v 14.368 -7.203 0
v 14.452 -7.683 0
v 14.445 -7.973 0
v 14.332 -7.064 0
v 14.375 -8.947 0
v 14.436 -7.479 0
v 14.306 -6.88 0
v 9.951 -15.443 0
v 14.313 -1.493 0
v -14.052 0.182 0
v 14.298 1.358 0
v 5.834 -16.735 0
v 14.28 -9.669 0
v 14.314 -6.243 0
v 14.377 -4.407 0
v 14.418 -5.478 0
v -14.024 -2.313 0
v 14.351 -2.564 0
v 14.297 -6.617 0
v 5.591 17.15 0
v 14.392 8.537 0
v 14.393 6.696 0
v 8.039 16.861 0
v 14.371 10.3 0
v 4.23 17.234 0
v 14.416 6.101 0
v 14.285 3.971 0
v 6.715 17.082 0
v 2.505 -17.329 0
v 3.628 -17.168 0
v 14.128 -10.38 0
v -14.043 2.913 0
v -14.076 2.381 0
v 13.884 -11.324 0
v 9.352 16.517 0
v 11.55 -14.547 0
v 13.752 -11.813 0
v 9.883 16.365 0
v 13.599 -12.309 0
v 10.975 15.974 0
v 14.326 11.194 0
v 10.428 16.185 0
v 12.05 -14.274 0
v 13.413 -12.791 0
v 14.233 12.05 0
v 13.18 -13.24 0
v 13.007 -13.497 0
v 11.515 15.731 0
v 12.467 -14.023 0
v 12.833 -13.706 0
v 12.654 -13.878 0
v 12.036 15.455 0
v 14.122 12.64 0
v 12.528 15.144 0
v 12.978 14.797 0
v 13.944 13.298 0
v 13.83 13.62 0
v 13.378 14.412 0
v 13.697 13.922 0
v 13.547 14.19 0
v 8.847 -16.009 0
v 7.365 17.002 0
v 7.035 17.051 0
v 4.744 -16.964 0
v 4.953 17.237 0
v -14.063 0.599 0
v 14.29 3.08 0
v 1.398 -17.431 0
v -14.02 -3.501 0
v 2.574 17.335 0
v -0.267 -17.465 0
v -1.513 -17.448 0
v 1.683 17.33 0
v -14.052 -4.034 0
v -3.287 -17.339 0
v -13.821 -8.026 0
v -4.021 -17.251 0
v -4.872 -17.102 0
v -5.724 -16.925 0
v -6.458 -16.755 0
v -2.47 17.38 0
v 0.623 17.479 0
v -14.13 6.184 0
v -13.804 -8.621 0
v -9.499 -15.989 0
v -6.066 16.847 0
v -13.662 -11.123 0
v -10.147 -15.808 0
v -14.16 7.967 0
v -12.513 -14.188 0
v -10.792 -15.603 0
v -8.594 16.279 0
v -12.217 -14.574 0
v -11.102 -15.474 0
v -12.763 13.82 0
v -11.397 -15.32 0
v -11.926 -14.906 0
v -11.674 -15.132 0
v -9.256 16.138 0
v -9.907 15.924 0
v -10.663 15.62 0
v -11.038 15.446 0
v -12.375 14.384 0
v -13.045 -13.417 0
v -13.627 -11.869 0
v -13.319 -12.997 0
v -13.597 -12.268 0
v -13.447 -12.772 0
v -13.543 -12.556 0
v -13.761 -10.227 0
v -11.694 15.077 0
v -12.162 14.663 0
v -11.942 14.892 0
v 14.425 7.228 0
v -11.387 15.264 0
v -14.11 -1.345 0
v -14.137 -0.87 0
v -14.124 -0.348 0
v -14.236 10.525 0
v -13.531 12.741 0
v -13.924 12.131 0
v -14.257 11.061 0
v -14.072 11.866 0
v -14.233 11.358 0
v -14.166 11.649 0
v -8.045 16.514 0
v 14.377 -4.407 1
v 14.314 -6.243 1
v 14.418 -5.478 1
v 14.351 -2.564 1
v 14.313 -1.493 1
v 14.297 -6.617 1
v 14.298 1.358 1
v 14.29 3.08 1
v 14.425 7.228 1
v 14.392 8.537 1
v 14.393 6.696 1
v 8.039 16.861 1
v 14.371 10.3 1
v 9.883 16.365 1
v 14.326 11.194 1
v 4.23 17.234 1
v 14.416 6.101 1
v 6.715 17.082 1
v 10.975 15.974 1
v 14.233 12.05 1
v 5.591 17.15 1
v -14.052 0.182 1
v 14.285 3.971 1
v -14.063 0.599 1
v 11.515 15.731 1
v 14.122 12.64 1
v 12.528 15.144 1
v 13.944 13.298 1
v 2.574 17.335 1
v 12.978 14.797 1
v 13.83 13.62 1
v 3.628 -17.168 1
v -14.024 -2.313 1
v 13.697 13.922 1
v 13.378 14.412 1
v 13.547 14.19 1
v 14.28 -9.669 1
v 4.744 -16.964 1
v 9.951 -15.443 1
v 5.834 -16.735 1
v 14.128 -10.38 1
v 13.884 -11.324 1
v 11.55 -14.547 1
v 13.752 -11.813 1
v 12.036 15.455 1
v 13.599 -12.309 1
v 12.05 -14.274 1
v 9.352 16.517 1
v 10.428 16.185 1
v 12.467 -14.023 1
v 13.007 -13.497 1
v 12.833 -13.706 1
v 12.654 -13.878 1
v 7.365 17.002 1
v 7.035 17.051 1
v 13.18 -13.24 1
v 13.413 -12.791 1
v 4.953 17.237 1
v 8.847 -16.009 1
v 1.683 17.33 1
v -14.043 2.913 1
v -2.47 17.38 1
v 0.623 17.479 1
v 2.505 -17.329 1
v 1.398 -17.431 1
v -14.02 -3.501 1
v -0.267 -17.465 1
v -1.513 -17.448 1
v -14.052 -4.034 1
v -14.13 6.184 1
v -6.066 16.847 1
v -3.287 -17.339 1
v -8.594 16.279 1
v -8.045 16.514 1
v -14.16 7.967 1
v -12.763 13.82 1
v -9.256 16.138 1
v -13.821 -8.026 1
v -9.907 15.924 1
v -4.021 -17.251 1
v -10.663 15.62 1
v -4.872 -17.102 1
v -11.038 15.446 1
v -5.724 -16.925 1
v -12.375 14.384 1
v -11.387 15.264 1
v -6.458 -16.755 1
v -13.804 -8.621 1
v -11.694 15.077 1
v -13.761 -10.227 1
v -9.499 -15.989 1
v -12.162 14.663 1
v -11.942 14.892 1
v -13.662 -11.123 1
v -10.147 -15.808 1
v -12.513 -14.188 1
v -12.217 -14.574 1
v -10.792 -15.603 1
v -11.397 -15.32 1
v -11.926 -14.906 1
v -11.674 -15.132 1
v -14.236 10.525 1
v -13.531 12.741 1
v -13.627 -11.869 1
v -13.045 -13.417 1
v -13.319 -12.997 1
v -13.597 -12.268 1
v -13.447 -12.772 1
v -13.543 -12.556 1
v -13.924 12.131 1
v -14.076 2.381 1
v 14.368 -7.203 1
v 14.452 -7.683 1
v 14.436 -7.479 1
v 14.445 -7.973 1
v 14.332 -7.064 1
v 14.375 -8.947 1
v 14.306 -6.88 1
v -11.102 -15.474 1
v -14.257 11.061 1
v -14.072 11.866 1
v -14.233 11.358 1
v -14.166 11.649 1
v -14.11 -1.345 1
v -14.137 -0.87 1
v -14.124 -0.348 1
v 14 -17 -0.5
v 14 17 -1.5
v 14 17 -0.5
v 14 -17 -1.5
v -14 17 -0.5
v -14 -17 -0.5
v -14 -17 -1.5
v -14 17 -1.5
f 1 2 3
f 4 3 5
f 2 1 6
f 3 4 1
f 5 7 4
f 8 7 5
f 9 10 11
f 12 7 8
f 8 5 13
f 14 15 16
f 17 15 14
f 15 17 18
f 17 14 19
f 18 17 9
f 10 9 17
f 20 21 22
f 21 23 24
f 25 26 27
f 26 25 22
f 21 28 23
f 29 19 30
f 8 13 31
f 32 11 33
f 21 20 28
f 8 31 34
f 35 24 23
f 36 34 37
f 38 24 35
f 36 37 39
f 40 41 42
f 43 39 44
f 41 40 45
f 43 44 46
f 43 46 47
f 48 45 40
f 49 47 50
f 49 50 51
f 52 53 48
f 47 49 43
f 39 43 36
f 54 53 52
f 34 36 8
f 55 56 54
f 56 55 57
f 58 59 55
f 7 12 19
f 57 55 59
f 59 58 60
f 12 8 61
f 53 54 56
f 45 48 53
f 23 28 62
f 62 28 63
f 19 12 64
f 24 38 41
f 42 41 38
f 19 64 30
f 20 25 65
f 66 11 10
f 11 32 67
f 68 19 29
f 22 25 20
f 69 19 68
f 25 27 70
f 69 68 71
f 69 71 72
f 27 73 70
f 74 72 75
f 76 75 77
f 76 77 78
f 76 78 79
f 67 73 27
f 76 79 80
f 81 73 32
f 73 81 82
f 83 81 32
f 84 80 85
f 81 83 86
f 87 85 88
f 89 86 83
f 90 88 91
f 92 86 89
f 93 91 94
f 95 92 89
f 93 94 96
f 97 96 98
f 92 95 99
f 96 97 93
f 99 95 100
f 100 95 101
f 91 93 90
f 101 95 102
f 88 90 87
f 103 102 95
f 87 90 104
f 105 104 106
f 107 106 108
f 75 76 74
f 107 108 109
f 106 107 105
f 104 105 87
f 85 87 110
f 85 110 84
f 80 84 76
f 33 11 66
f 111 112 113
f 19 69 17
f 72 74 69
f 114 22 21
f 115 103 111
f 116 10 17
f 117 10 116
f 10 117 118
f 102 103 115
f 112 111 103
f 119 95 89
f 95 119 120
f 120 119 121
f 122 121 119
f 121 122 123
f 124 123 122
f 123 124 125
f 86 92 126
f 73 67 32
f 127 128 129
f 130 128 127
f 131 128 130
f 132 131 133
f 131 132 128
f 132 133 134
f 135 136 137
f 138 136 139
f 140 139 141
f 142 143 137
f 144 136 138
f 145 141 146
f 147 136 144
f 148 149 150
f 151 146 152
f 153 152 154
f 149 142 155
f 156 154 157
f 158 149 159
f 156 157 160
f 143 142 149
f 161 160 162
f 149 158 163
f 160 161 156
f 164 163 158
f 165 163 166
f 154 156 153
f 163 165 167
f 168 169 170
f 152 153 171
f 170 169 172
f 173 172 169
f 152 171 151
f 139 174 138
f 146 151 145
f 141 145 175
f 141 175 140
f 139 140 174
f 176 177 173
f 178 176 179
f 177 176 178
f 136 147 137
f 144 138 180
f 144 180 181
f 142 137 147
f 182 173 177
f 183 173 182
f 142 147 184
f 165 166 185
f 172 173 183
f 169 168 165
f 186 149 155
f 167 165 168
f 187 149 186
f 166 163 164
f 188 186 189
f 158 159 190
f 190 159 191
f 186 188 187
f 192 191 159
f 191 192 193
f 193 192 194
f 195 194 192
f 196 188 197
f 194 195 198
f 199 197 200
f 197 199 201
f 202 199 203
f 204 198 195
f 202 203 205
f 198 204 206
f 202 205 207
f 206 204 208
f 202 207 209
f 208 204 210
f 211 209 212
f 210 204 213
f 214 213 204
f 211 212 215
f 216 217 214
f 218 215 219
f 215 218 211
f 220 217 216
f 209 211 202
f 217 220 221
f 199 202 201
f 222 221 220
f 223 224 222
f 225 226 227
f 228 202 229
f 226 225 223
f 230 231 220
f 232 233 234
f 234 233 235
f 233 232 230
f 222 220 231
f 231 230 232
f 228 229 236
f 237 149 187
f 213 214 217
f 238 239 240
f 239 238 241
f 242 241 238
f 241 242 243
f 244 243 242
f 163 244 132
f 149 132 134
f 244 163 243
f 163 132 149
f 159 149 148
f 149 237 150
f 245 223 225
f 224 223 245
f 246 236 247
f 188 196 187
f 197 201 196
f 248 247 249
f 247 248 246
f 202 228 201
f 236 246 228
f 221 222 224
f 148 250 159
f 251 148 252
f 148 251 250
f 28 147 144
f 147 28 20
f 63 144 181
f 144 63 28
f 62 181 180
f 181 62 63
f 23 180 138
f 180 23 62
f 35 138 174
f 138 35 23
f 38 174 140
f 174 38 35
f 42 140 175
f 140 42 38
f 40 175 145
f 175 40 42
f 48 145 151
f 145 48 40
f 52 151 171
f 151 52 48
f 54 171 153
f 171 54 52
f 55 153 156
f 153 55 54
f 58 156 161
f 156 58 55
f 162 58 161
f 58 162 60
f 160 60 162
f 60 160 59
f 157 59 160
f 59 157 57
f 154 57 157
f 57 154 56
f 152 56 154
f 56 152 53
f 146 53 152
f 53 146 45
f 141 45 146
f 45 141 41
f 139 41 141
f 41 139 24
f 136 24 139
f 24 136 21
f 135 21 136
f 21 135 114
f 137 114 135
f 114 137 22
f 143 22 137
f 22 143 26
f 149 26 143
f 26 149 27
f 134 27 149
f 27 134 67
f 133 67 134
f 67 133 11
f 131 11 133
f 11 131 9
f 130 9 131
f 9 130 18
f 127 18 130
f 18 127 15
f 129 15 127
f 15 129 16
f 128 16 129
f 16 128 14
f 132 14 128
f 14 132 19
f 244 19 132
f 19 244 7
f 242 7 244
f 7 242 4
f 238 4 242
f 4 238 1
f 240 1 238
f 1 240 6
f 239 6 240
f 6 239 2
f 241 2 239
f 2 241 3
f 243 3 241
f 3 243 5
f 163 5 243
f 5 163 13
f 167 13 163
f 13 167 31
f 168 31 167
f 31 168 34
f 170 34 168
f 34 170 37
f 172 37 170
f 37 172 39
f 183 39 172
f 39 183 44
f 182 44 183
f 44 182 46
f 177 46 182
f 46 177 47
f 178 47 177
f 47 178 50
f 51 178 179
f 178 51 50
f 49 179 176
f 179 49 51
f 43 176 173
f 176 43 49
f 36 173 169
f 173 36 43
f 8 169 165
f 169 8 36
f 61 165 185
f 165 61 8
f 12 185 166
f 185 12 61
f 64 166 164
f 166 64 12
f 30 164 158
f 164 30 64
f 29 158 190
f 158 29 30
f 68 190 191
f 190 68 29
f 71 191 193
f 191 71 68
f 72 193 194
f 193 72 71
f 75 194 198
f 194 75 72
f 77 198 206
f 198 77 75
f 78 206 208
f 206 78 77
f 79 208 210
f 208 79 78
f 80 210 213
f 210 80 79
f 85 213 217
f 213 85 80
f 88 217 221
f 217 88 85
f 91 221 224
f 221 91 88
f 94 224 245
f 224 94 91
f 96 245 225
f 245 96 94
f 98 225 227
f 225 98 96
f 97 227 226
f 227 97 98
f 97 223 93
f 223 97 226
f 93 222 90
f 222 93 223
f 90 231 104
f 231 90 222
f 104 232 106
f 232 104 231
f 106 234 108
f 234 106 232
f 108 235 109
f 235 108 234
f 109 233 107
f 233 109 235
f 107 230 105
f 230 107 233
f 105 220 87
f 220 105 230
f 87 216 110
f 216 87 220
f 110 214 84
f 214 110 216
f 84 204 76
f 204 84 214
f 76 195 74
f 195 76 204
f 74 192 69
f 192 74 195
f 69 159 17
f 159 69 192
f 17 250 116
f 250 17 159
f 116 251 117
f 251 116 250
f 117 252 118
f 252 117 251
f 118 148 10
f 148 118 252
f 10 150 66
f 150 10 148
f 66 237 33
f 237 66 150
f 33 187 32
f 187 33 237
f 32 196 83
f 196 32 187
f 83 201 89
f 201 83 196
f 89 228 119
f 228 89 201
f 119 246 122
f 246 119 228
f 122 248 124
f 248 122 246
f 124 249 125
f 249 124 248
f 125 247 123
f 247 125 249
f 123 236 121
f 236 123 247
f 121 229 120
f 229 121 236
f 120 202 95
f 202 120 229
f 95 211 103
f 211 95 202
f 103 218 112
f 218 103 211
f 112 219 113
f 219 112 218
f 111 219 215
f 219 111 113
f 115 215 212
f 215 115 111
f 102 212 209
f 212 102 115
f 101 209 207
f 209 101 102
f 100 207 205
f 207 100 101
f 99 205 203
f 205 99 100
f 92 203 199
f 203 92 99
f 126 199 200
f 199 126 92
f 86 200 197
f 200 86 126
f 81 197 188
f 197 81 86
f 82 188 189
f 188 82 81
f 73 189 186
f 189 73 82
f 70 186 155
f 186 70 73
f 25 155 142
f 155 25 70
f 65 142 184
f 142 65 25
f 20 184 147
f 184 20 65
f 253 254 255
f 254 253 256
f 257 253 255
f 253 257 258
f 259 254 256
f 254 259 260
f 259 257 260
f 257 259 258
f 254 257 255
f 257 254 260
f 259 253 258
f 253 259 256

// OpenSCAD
// file: ../../usb-210-filter-outline.scad
module usb210_filter_attachementOutline(h = 1)
{
	xyScale = 0.21;

	rotate([0, 0, -3.5])
	scale([xyScale, xyScale, 1])
	usb210_filter_rawAttachementOutline(h = h);
}

module usb210_filter_rawAttachementOutline(h = 1)
{
  scale([25.4/90, -25.4/90, 1]) union()
  {
    linear_extrude(height=h)
      polygon([[10.495000,-293.595000],[25.495000,-294.595000],[53.495000,-294.595000],[65.665000,-295.405000],[76.495000,-294.595000],[95.495000,-294.595000],[100.916973,-294.412324],[106.521406,-293.919219],[118.028750,-292.241250],[140.495000,-287.795000],[149.589863,-285.789746],[158.948281,-283.312344],[168.388496,-280.326582],[177.728750,-276.796250],[186.787285,-272.685137],[195.382344,-267.957031],[203.332168,-262.575723],[210.455000,-256.505000],[213.531230,-252.936113],[216.342969,-248.573281],[218.883535,-243.628496],[221.146250,-238.313750],[224.811406,-227.422344],[227.285000,-217.595000],[229.736094,-203.277188],[231.413750,-188.275000],[233.585000,-158.595000],[235.495000,-136.595000],[235.495000,-127.595000],[236.495000,-117.595000],[236.495000,-81.595000],[237.495000,-66.595000],[239.405000,-37.595000],[242.585000,10.405000],[244.325000,28.405000],[246.665000,59.405000],[248.455000,77.405000],[247.495000,90.405000],[247.600020,96.716934],[248.020156,101.127969],[248.654277,104.204707],[249.401250,106.513750],[250.829219,111.095156],[251.307949,114.500723],[251.495000,119.405000],[251.305625,135.875469],[250.460000,148.126250],[248.631875,160.266406],[245.495000,176.405000],[243.768281,184.787187],[241.708750,193.287500],[239.069844,201.596563],[235.605000,209.405000],[232.951152,213.917461],[230.238594,217.617812],[227.409551,220.690508],[224.406250,223.320000],[217.645781,227.987187],[209.495000,233.095000],[183.495000,249.825000],[165.495000,260.505000],[115.495000,275.825000],[97.369531,280.804688],[78.776250,285.392500],[60.042344,289.271562],[41.495000,292.125000],[13.495000,294.405000],[-7.505000,295.405000],[-37.505000,295.405000],[-49.954531,294.673594],[-64.441250,293.033750],[-78.959844,290.934531],[-91.505000,288.825000],[-143.505000,279.055000],[-154.602656,276.681406],[-165.678750,273.888750],[-171.032051,272.043770],[-176.167969,269.744219],[-181.015840,266.873496],[-185.505000,263.315000],[-190.732500,258.022344],[-196.117500,251.828750],[-205.875000,239.405000],[-210.922500,232.607500],[-213.311250,228.950938],[-215.145000,225.405000],[-216.349844,220.614375],[-217.268750,213.922500],[-218.635000,201.405000],[-221.225000,186.405000],[-223.595000,159.405000],[-224.505000,149.405000],[-232.505000,82.405000],[-232.505000,73.405000],[-233.795000,53.405000],[-236.250000,37.178750],[-237.189687,29.207656],[-237.505000,20.405000],[-236.845000,11.405000],[-237.465000,4.405000],[-239.505000,-25.595000],[-239.505000,-34.595000],[-244.335000,-89.595000],[-246.675000,-119.595000],[-250.595000,-162.595000],[-251.495000,-171.595000],[-251.406250,-176.628750],[-250.575000,-181.595000],[-249.208418,-185.344629],[-247.003594,-189.963906],[-241.008750,-200.643750],[-229.185000,-219.595000],[-223.222500,-229.507500],[-219.934687,-234.422500],[-216.465000,-238.505000],[-212.478965,-241.879805],[-207.496719,-245.332188],[-201.800801,-248.765352],[-195.673750,-252.082500],[-183.256406,-257.981562],[-172.505000,-262.255000],[-161.505000,-265.305000],[-152.505000,-269.835000],[-119.505000,-277.475000],[-59.505000,-290.165000],[-7.505000,-295.005000],[10.495000,-293.595000]]);
  }
}
// main file
use <../../usb-210-filter-outline.scad>

usb210_filter_attachementOutline(h = 1);

color("blue")
translate([0,0,-1])
cube([28, 34, 1], center = true);
